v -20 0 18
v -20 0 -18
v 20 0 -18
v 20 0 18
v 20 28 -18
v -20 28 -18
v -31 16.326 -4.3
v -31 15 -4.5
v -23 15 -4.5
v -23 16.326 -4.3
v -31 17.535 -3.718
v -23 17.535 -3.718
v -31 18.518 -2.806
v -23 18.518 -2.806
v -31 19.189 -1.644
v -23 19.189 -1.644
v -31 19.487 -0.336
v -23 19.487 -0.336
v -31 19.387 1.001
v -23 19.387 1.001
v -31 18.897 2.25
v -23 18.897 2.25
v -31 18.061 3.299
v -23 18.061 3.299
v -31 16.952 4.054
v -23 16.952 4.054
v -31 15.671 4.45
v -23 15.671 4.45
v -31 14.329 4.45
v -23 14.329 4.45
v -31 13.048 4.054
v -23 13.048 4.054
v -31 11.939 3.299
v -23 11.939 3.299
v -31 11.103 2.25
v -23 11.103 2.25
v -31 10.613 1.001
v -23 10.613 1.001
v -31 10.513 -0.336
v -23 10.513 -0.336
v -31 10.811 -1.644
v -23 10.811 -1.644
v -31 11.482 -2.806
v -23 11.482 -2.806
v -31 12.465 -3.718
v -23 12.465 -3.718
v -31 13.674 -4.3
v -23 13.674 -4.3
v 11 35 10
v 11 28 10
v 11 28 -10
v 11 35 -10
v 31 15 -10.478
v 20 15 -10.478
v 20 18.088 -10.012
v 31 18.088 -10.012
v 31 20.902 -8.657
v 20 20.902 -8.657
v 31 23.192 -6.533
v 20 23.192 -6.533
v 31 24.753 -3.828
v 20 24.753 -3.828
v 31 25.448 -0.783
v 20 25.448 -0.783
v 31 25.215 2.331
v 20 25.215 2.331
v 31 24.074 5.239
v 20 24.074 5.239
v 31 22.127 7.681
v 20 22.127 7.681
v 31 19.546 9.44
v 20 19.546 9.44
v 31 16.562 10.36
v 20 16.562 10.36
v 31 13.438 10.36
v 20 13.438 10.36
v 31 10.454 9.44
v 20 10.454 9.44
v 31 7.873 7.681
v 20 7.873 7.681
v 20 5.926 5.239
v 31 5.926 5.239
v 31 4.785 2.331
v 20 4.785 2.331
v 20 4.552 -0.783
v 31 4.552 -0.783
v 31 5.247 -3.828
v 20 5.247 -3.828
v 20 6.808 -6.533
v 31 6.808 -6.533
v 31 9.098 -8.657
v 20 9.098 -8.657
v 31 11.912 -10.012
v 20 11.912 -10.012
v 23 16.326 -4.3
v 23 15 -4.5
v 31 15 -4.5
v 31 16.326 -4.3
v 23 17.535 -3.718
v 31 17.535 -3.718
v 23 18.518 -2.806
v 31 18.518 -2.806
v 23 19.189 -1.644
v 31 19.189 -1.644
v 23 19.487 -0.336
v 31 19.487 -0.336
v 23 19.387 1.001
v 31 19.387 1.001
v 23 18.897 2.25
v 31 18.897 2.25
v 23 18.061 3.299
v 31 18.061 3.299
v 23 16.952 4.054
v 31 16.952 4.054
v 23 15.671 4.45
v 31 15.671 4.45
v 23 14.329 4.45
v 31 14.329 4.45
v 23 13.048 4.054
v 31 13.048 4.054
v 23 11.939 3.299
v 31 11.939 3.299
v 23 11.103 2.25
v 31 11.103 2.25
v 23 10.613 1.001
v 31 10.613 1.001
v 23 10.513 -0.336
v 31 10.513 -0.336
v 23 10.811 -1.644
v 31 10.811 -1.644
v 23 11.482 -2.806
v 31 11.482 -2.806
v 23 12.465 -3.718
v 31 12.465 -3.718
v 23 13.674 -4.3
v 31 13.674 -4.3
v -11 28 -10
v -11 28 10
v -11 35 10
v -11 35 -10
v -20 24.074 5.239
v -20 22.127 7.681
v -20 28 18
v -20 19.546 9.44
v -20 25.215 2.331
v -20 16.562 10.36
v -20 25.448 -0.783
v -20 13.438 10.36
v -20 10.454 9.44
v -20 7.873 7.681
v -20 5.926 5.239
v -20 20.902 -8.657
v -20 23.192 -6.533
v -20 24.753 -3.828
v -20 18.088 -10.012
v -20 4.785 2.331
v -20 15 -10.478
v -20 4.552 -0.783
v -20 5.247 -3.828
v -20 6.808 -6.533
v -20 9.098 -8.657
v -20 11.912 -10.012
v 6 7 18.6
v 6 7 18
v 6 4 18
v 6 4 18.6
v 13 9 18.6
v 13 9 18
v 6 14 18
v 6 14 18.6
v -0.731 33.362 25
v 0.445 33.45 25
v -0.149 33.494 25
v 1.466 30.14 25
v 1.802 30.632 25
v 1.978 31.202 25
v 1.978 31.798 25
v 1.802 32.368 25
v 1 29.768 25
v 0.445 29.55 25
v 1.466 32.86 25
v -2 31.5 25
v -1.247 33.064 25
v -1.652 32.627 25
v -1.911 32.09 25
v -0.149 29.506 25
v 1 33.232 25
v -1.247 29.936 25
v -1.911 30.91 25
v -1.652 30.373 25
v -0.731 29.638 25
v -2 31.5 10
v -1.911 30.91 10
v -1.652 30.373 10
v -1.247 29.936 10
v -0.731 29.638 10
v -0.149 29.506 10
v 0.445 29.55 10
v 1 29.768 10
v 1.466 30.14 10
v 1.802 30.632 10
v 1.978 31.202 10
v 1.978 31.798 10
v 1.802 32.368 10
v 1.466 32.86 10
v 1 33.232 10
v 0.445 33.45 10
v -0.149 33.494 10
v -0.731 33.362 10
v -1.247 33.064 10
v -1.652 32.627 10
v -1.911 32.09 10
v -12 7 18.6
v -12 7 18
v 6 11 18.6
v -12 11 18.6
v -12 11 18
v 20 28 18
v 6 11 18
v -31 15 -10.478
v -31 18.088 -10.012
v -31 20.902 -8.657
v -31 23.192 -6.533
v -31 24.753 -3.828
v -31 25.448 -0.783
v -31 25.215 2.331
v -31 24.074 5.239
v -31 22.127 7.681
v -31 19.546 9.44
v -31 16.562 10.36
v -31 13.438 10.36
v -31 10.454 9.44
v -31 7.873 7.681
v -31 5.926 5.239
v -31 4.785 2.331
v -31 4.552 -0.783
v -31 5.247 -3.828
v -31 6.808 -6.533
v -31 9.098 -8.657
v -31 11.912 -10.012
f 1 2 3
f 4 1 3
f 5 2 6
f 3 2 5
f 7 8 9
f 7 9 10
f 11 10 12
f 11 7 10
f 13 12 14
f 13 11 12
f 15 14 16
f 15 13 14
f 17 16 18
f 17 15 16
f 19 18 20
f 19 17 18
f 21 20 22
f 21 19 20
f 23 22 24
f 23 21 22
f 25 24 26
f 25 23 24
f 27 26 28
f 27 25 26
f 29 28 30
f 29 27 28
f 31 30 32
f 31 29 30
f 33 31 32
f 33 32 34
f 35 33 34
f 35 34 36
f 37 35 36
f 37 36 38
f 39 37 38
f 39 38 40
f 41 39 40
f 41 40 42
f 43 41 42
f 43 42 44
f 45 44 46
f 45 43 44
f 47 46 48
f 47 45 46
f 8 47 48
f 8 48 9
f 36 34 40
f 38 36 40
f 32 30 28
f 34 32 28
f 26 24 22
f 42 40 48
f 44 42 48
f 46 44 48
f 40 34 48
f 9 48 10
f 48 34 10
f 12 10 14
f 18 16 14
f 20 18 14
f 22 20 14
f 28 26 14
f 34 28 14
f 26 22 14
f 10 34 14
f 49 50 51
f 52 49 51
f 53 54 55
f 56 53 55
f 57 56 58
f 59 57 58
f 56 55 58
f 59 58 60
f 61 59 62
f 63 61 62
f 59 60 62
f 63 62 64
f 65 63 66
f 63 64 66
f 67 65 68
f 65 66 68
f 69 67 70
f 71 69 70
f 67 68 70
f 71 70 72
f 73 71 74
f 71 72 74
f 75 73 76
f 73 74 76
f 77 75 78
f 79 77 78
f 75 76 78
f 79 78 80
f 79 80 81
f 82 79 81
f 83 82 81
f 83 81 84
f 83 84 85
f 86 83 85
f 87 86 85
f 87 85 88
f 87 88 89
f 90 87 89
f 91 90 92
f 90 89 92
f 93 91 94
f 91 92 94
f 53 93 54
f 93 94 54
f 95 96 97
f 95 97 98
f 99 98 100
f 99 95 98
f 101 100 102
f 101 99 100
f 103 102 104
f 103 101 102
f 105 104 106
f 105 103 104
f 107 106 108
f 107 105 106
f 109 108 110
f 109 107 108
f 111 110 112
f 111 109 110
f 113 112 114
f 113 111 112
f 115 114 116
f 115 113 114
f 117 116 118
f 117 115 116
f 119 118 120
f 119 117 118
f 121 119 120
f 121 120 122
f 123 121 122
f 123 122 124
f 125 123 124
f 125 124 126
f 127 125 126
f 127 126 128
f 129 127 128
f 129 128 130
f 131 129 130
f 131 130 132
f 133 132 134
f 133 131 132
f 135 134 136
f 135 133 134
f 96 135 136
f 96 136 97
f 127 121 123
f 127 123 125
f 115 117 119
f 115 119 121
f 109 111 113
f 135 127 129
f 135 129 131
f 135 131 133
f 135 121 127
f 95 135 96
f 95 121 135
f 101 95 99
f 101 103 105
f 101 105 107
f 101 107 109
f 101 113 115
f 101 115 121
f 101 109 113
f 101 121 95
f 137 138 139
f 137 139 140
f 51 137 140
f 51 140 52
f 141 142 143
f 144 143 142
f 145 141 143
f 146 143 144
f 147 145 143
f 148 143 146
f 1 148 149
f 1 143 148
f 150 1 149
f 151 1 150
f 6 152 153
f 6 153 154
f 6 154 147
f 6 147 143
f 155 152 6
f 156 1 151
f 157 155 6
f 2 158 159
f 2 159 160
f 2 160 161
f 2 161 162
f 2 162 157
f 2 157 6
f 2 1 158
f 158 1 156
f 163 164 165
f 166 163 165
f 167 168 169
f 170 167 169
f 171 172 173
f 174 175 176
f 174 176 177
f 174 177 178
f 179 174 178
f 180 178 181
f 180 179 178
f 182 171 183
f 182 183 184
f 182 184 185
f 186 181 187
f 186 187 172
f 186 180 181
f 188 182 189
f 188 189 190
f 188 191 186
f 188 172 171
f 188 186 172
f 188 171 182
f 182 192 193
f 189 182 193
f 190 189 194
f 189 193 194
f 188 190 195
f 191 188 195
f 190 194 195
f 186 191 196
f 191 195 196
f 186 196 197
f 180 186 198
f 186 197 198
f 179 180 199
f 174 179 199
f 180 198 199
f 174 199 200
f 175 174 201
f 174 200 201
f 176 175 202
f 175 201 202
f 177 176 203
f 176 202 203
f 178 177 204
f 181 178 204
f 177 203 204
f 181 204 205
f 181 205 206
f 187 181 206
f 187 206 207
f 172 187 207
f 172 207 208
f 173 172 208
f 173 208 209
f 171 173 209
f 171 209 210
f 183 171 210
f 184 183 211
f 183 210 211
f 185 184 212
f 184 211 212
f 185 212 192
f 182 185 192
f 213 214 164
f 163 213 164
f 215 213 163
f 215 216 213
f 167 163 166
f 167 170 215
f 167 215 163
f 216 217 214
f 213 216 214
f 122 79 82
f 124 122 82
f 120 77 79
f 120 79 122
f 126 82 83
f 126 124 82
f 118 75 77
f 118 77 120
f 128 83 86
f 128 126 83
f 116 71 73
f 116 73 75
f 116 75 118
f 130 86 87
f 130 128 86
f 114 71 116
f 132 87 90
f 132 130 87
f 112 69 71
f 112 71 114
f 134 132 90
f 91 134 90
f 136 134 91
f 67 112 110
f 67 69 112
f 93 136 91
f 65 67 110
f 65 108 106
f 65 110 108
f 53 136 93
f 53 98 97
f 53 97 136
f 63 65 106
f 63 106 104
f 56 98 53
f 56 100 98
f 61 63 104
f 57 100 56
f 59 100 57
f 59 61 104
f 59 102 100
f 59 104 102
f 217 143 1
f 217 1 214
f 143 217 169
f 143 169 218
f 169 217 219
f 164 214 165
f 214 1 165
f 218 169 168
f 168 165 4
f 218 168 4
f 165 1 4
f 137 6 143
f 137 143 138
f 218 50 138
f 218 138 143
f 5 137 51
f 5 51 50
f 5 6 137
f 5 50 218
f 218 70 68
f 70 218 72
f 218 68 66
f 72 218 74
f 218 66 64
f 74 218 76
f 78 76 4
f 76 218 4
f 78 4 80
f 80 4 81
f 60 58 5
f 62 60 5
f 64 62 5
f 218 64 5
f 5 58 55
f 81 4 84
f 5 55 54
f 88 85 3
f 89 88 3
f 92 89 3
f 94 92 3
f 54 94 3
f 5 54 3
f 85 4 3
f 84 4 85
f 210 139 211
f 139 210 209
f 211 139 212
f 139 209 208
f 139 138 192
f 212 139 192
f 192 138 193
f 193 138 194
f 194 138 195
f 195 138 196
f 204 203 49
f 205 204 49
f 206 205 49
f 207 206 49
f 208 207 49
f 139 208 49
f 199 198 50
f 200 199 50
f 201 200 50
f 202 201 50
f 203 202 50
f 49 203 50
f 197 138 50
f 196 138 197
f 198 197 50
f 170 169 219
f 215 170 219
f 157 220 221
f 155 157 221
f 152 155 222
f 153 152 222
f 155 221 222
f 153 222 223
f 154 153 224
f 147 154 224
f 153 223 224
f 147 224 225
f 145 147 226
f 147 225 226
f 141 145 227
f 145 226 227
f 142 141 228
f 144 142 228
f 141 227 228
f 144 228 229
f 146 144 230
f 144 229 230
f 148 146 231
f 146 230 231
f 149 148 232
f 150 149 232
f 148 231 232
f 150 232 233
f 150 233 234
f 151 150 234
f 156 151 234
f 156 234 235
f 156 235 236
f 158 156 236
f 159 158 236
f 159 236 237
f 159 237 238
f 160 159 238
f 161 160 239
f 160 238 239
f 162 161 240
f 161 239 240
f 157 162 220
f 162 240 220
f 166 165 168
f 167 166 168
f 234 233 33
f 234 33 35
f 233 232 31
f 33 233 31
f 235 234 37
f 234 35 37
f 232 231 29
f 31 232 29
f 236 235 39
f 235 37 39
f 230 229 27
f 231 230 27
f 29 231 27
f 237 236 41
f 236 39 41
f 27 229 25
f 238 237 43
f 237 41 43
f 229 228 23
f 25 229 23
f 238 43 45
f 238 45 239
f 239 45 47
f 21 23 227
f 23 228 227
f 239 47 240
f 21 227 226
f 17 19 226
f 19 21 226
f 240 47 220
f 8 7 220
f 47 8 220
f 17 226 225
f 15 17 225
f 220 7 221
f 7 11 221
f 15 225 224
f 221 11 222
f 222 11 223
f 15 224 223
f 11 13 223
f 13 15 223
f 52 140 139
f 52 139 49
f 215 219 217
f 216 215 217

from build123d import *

# Parameters (mm, degrees)
SKETCH1_W            = 40
SKETCH1_H            = 36
BODY_DEPTH           = 28
SENSOR_HOUSING_START = 28
SKETCH2_W            = 22
SKETCH2_H            = 20
SENSOR_HOUSING_DEPTH = 7
INLET_THREAD_START   = -31
SKETCH3_R            = 10.4775
INLET_THREAD_DEPTH   = 11
OUTLET_THREAD_START  = 20
SKETCH4_R            = 10.4775
OUTLET_THREAD_DEPTH  = 11
INLET_BORE_START     = -31
SKETCH5_R            = 4.5
INLET_BORE_DEPTH     = 8
OUTLET_BORE_START    = 23
SKETCH6_R            = 4.5
OUTLET_BORE_DEPTH    = 8
CABLE_STUB_START     = 10
SKETCH7_R            = 2
CABLE_STUB_DEPTH     = 15
FLOW_ARROW_START     = 18
FLOW_ARROW_DEPTH     = 0.6


with BuildPart() as part:
    # Sketch1 → Body (new body)
    with BuildSketch(Plane(origin=(0, 0, 0), x_dir=(1, 0, 0), z_dir=(0, 1, 0))):
        Rectangle(SKETCH1_W, SKETCH1_H)
    extrude(amount=BODY_DEPTH)

    # Sketch2 → Sensor_Housing (add)
    with BuildSketch(Plane(origin=(0, 0, 0), x_dir=(1, 0, 0), z_dir=(0, 1, 0)).offset(SENSOR_HOUSING_START)):
        Rectangle(SKETCH2_W, SKETCH2_H)
    extrude(amount=SENSOR_HOUSING_DEPTH)

    # Sketch3 → Inlet_Thread (add)
    with BuildSketch(Plane(origin=(0, 0, 0), x_dir=(0, 0, -1), z_dir=(1, 0, 0)).offset(INLET_THREAD_START)):
        with Locations((0, 15)):
            Circle(SKETCH3_R)
    extrude(amount=INLET_THREAD_DEPTH)

    # Sketch4 → Outlet_Thread (add)
    with BuildSketch(Plane(origin=(0, 0, 0), x_dir=(0, 0, -1), z_dir=(1, 0, 0)).offset(OUTLET_THREAD_START)):
        with Locations((0, 15)):
            Circle(SKETCH4_R)
    extrude(amount=OUTLET_THREAD_DEPTH)

    # Sketch5 → Inlet_Bore (cut)
    with BuildSketch(Plane(origin=(0, 0, 0), x_dir=(0, 0, -1), z_dir=(1, 0, 0)).offset(INLET_BORE_START)):
        with Locations((0, 15)):
            Circle(SKETCH5_R)
    extrude(amount=INLET_BORE_DEPTH, mode=Mode.SUBTRACT)

    # Sketch6 → Outlet_Bore (cut)
    with BuildSketch(Plane(origin=(0, 0, 0), x_dir=(0, 0, -1), z_dir=(1, 0, 0)).offset(OUTLET_BORE_START)):
        with Locations((0, 15)):
            Circle(SKETCH6_R)
    extrude(amount=OUTLET_BORE_DEPTH, mode=Mode.SUBTRACT)

    # Sketch7 → Cable_Stub (add)
    with BuildSketch(Plane.XY.offset(CABLE_STUB_START)):
        with Locations(Location((0, 31.5, 0), (0, 0, 180))):
            Circle(SKETCH7_R)
    extrude(amount=CABLE_STUB_DEPTH)

    # Sketch8 → Flow_Arrow (add)
    with BuildSketch(Plane.XY.offset(FLOW_ARROW_START)):
        Polygon((-12, 7), (6, 7), (6, 4), (13, 9), (6, 14), (6, 11), (-12, 11), align=None)
    extrude(amount=FLOW_ARROW_DEPTH)


solid = part.part
